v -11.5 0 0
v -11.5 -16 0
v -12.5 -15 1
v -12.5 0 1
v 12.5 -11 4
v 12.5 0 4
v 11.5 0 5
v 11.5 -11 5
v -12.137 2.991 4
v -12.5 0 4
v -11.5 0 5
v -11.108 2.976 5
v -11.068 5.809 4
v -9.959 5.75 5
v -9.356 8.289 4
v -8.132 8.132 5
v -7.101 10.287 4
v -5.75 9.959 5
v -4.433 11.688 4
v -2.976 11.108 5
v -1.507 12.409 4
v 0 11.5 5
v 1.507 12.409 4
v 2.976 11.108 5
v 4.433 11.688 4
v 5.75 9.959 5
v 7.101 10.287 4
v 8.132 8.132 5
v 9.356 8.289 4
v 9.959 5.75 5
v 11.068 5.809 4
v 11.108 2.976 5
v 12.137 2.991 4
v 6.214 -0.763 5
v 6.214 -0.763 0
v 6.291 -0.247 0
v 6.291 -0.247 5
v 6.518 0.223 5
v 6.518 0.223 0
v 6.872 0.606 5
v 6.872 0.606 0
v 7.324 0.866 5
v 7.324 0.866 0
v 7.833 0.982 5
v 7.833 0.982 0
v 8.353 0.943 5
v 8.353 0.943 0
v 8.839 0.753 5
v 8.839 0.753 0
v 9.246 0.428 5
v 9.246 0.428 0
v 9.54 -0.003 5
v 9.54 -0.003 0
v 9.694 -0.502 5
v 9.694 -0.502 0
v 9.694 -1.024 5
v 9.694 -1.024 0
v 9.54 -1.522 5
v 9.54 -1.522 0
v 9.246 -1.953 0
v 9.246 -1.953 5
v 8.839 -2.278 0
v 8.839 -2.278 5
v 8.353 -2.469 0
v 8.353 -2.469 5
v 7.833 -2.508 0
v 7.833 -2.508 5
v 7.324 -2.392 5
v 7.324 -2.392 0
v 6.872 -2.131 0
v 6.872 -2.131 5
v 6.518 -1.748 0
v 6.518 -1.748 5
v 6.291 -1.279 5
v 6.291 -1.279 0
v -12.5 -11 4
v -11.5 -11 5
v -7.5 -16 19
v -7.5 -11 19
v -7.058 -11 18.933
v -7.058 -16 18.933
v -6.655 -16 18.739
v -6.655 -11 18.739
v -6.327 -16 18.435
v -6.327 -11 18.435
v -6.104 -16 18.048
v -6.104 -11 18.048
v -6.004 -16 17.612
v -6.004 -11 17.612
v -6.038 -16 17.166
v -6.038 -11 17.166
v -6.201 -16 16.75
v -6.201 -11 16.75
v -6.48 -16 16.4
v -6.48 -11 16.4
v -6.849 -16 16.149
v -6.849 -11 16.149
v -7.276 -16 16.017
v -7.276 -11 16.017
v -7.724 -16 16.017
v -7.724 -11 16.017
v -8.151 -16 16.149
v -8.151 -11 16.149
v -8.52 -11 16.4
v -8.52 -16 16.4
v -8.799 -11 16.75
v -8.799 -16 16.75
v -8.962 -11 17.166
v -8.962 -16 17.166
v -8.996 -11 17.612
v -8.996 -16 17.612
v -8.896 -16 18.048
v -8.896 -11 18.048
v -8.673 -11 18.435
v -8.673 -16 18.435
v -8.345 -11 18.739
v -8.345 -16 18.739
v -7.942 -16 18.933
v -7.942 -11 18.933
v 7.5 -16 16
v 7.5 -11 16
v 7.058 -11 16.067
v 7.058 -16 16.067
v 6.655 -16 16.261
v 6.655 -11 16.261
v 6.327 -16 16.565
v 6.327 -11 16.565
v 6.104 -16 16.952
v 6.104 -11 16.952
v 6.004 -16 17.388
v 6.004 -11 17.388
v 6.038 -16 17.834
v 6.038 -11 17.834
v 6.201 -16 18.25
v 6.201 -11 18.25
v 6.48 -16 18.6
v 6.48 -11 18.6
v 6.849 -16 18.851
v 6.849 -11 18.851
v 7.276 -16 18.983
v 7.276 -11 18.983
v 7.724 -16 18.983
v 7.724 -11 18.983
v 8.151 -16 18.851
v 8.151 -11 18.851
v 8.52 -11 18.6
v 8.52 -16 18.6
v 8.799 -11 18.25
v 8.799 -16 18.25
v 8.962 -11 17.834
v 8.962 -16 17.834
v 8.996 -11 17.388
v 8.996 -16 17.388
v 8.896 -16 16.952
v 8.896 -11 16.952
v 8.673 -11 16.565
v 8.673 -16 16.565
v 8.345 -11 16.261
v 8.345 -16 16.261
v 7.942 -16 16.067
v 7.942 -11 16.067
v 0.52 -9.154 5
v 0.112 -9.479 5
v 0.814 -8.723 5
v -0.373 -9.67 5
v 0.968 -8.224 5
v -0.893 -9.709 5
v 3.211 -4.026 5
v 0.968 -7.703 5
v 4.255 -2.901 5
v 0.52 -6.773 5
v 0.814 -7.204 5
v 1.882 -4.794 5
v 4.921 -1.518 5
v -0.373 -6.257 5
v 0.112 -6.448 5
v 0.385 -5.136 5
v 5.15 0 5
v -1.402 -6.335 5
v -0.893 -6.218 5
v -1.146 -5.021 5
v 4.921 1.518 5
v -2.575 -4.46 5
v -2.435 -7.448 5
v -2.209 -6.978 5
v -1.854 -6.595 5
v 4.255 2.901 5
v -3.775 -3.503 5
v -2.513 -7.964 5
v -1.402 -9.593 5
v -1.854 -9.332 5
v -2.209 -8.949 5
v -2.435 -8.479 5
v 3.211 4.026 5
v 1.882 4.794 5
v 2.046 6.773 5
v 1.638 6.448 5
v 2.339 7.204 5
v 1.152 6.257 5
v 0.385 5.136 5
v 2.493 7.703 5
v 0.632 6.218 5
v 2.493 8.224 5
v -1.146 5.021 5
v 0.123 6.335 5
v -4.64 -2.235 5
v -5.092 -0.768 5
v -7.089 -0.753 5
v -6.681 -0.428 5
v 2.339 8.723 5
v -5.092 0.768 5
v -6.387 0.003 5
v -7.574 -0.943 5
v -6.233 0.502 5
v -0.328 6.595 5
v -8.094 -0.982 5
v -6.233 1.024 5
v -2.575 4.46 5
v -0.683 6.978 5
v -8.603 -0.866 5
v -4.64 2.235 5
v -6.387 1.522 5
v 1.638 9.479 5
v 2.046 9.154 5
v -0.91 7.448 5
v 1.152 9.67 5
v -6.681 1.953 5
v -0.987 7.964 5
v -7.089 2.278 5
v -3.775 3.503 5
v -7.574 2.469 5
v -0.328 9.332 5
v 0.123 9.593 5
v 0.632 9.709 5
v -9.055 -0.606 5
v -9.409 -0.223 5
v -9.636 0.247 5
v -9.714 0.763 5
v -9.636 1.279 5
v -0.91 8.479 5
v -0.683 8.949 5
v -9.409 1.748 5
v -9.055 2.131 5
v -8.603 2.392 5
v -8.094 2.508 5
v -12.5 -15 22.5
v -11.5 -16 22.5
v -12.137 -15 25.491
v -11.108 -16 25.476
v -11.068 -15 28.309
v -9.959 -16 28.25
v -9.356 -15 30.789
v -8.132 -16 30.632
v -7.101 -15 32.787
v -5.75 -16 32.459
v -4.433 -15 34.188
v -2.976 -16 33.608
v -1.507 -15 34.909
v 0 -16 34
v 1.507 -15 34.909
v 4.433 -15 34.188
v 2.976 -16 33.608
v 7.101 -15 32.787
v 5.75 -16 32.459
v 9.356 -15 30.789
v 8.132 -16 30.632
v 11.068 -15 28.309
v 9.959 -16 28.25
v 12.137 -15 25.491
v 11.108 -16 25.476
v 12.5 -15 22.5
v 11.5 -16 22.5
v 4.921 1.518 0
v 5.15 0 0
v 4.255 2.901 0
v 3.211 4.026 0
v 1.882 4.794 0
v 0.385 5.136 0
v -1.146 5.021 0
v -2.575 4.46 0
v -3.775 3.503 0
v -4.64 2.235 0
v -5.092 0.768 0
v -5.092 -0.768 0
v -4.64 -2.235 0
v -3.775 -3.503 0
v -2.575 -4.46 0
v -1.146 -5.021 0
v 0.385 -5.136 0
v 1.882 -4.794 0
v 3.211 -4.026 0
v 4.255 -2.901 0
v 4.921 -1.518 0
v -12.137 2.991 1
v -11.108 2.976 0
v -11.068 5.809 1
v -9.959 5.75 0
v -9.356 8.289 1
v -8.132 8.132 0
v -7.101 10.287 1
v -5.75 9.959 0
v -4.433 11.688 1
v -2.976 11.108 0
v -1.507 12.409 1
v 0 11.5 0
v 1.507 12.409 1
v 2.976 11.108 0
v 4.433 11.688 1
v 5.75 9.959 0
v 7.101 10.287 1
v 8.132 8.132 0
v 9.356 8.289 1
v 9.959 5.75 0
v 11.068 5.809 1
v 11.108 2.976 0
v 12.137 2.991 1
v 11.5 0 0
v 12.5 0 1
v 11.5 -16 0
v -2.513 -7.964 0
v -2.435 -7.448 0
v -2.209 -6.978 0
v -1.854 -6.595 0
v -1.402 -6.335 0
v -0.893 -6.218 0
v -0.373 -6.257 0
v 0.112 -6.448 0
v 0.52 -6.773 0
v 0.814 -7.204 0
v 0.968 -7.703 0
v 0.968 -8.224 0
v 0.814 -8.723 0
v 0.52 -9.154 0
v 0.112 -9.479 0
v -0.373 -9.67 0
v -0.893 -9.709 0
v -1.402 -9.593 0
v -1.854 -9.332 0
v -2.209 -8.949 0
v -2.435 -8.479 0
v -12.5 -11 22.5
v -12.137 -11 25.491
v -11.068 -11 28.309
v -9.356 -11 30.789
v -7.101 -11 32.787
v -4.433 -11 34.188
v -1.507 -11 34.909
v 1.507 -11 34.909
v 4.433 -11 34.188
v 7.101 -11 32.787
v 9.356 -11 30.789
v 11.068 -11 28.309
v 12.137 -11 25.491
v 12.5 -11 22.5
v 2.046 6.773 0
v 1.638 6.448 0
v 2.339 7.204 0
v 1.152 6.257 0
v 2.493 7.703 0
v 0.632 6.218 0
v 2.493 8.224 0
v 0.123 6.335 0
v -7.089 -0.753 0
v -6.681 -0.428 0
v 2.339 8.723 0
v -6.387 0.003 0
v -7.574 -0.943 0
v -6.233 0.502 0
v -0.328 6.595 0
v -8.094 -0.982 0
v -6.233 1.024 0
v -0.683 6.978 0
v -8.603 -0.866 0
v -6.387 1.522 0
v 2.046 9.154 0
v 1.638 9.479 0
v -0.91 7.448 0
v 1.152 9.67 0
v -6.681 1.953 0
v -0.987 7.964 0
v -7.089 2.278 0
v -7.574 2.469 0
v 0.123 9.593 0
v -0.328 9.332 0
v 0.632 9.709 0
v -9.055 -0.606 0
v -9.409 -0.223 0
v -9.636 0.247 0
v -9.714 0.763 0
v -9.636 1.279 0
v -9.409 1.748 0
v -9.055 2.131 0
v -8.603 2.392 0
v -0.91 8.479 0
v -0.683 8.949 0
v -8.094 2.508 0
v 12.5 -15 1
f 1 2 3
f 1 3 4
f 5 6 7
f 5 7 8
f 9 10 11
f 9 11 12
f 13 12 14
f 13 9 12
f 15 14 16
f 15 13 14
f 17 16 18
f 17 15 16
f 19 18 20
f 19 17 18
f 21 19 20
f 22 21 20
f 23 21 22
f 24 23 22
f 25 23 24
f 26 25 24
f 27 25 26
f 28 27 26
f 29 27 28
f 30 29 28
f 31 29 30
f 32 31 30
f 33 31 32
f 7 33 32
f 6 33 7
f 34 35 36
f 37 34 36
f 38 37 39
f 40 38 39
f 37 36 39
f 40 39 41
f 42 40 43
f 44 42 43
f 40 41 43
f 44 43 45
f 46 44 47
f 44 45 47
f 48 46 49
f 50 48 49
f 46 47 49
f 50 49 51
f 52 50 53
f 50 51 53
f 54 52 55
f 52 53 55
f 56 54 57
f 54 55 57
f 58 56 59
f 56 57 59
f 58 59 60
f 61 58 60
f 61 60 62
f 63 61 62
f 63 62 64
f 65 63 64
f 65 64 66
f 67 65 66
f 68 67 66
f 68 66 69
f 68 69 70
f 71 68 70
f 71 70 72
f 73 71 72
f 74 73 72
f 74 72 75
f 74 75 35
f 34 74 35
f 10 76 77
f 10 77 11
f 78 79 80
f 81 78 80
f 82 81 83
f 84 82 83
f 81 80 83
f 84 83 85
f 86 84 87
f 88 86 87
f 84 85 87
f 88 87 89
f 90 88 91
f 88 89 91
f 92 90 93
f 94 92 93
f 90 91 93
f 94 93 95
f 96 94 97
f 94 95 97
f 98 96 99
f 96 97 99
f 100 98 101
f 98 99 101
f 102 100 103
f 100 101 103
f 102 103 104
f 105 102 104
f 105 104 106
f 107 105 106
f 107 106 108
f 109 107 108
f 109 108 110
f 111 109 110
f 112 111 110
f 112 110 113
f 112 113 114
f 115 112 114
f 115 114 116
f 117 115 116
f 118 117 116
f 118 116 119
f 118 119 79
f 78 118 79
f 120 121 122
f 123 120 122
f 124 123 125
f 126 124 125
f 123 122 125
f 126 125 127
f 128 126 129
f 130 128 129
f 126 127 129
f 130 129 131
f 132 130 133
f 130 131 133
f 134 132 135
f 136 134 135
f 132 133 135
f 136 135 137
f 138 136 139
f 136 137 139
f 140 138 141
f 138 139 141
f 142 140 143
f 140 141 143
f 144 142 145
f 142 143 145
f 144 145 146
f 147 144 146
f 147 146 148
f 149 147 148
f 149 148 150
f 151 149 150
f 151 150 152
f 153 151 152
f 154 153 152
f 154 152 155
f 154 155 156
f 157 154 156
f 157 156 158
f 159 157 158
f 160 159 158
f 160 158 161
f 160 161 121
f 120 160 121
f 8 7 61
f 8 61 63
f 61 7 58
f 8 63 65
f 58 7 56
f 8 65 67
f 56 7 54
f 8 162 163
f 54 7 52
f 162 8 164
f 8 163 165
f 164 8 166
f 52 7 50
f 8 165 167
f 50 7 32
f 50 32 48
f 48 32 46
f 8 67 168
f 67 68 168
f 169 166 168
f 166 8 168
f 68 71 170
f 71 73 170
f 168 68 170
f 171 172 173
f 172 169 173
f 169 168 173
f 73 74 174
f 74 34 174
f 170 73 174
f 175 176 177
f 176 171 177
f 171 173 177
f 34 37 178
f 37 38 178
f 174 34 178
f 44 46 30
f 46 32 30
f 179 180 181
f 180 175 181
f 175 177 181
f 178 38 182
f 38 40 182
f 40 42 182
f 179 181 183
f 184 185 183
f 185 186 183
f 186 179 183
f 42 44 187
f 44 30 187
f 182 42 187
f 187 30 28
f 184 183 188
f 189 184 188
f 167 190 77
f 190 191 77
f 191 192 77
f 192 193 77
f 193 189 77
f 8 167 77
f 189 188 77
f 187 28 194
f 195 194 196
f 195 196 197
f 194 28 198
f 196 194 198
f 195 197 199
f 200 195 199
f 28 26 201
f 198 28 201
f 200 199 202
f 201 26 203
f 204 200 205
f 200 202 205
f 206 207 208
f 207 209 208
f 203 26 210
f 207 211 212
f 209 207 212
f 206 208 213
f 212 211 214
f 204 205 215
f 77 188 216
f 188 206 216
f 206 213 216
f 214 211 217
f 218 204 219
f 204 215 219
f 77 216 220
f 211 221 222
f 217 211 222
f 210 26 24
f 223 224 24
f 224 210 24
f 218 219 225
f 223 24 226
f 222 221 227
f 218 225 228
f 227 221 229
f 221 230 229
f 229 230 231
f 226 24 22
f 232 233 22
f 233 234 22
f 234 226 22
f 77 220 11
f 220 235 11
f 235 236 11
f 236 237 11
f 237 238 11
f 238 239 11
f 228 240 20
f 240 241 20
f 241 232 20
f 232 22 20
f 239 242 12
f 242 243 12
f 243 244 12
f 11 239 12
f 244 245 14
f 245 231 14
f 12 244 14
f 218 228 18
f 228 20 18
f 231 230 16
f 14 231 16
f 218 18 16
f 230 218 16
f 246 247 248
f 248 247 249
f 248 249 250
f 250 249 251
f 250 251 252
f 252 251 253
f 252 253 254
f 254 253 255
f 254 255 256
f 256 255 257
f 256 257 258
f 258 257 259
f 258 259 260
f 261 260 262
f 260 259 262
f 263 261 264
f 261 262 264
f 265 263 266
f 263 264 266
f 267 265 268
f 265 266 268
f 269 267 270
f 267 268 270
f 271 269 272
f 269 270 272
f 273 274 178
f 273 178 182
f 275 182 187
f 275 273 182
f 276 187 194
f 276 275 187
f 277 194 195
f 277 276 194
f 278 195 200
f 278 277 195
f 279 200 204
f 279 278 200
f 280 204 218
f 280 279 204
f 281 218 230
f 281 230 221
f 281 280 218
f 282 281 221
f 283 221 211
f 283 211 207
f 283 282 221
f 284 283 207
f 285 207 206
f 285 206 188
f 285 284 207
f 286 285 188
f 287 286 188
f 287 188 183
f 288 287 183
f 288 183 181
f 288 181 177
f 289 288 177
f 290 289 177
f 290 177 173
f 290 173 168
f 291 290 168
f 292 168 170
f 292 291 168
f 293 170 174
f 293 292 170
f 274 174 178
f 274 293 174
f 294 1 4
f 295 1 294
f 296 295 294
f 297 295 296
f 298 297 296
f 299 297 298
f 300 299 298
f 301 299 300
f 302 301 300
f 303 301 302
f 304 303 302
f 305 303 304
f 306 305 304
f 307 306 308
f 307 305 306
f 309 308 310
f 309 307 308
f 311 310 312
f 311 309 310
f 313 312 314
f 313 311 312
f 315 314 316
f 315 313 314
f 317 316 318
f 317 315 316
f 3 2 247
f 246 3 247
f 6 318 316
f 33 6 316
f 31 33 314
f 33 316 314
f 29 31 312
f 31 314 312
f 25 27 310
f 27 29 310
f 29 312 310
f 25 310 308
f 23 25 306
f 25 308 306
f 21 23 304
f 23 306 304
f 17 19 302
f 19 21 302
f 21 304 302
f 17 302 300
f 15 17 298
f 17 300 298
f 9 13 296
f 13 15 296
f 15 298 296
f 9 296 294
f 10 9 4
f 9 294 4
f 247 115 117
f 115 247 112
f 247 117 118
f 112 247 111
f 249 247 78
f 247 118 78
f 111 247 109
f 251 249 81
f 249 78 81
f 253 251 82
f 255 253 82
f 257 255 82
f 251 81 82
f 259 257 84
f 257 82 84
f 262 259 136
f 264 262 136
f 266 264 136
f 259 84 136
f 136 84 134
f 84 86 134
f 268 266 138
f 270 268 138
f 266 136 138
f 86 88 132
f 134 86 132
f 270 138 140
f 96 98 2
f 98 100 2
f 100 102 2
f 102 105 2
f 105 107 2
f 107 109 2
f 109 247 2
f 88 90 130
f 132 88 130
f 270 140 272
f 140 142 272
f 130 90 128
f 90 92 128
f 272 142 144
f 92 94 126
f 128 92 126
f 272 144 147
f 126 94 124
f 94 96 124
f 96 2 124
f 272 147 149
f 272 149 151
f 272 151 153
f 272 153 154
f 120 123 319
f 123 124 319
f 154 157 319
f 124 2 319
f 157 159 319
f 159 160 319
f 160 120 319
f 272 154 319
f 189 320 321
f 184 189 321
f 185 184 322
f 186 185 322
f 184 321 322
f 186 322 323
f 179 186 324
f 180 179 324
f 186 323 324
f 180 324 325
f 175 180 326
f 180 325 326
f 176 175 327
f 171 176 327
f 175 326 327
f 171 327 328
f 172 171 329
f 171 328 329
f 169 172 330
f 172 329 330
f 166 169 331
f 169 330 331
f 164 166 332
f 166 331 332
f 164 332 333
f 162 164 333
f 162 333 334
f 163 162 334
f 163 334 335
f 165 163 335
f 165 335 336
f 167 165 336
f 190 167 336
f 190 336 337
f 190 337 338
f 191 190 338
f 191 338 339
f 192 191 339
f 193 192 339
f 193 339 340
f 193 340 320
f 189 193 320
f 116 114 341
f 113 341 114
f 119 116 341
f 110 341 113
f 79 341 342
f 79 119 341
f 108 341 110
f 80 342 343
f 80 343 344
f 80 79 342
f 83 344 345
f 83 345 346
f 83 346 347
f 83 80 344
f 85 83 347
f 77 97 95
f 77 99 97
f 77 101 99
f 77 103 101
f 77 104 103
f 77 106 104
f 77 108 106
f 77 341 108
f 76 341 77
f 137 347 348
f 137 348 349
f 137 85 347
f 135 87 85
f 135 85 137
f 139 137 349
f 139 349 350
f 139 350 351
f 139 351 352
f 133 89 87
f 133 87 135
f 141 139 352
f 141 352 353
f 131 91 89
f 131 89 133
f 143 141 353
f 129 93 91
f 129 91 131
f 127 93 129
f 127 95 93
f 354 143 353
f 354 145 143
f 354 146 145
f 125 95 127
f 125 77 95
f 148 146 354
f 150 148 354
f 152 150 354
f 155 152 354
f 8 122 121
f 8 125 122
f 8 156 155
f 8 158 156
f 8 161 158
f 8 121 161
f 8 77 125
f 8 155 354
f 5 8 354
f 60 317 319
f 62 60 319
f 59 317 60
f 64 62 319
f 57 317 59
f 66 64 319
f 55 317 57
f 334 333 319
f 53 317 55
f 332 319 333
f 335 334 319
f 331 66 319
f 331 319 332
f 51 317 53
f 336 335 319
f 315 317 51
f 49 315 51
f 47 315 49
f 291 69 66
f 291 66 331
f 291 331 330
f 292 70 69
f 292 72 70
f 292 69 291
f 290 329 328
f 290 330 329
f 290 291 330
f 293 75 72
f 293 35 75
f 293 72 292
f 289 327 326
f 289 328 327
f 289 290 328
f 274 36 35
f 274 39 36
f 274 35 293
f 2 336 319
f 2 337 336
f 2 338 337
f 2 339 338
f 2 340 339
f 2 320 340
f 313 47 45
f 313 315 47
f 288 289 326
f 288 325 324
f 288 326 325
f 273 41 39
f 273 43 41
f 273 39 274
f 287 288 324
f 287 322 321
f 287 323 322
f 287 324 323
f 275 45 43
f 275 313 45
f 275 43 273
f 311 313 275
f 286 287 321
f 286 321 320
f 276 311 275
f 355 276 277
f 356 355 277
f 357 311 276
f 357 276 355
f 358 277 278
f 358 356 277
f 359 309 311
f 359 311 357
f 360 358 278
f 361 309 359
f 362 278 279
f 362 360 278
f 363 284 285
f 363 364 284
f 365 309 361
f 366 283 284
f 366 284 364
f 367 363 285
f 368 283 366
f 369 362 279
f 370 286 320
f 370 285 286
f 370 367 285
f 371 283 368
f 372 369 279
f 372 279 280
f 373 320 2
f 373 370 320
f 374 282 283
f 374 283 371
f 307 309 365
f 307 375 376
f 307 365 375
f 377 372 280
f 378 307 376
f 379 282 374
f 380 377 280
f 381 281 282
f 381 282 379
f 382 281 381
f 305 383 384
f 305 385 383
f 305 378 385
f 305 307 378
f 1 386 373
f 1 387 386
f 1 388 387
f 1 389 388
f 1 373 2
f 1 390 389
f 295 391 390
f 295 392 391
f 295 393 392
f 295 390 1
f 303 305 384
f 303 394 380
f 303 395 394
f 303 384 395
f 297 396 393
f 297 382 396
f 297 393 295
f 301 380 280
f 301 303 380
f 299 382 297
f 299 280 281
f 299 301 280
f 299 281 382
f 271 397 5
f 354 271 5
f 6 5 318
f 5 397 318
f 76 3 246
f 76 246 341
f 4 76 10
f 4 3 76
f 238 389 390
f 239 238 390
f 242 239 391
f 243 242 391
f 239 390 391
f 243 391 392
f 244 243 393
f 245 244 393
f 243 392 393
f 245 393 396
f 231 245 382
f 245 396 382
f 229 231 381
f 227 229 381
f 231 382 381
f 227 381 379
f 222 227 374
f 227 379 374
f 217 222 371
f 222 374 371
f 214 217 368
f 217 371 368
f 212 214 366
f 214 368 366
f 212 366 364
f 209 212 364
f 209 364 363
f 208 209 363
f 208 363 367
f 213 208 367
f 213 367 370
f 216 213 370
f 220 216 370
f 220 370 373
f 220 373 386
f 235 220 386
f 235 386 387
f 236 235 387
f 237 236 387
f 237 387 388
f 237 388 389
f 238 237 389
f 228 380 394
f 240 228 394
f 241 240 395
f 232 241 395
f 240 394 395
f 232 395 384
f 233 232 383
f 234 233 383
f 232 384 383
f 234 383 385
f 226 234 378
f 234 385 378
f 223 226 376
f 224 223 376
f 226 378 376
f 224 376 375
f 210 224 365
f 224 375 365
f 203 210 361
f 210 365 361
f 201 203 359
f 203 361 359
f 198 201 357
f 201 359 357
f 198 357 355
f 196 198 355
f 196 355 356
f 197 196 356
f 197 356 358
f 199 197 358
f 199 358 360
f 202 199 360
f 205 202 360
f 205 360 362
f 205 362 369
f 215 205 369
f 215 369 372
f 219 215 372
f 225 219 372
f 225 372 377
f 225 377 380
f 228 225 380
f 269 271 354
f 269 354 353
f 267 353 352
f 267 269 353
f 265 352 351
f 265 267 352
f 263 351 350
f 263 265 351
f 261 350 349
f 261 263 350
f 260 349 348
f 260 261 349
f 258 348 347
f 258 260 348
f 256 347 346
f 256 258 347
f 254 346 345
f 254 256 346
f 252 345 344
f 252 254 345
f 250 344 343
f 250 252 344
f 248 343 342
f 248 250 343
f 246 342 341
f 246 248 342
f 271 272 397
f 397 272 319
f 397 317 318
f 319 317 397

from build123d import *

# Parameters (mm, degrees)
ESQUISSE1_R             = 12.5
ESQUISSE1_R_2           = 5.15
BOSS_EXTRU_1_DEPTH      = 5
BOSS_EXTRU_2_DEPTH      = 5
ESQUISSE3_W             = 25
ESQUISSE3_H             = 5
BOSS_EXTRU_3_DEPTH      = 30
ESQUISSE5_R             = 1.75
ENL_V_MAT_EXTRU_1_DEPTH = 41.462946012
CONG_1_RADIUS           = 12.5
CONG_1_LENGTH           = 5
ESQUISSE6_R             = 1.5
ENL_V_MAT_EXTRU_2_DEPTH = 44.971581732
CHANFREIN1_SIZE         = 1
CHANFREIN2_SIZE         = 1


with BuildPart() as part:
    # Esquisse1 → Boss.-Extru.1 (new body)
    with BuildSketch(Plane.XY):
        Circle(ESQUISSE1_R)
        Circle(ESQUISSE1_R_2, mode=Mode.SUBTRACT)
    extrude(amount=BOSS_EXTRU_1_DEPTH)

    # Esquisse2 → Boss.-Extru.2 (add)
    with BuildSketch(Plane(origin=(0, 0, 0), x_dir=(-1, 0, 0), z_dir=(0, 0, -1))):
        with BuildLine():
            Line((-12.5, 0), (-12.5, -16))
            Line((-12.5, -16), (12.5, -16))
            Line((12.5, -16), (12.5, 0))
            ThreePointArc((12.5, 0), (0, -12.5), (-12.5, 0))
        make_face()
    extrude(amount=-BOSS_EXTRU_2_DEPTH)

    # Esquisse3 → Boss.-Extru.3 (add)
    with BuildSketch(Plane.XY.offset(5)):
        with Locations((0, -13.5)):
            Rectangle(ESQUISSE3_W, ESQUISSE3_H)
    extrude(amount=BOSS_EXTRU_3_DEPTH)

    # Esquisse5 → Enlèv. mat.-Extru.1 (cut, through all)
    with BuildSketch(Plane(origin=(0, 0, 0), x_dir=(-1, 0, 0), z_dir=(0, 0, -1))):
        with Locations((-0.762684291, 7.963561557)):
            Circle(ESQUISSE5_R)
        with Locations((-7.963561557, -0.762684291)):
            Circle(ESQUISSE5_R)
        with Locations((7.963561557, 0.762684291)):
            Circle(ESQUISSE5_R)
        with Locations((0.762684291, -7.963561557)):
            Circle(ESQUISSE5_R)
    extrude(amount=-ENL_V_MAT_EXTRU_1_DEPTH, mode=Mode.SUBTRACT)

    # Congé1: full round fillet: the end face becomes a half cylinder, R = half its width
    cong_1_face = Plane((0, -13.5, 35), x_dir=(0, -1, 0), z_dir=(0, 0, 1))  # on the end face: x along it, z out of the body
    cong_1_slab = cong_1_face.offset(-CONG_1_RADIUS / 2) * Box(CONG_1_LENGTH, 2 * CONG_1_RADIUS, CONG_1_RADIUS, mode=Mode.PRIVATE)  # the body's end, R deep
    cong_1_round = Plane((0, -13.5, 22.5), x_dir=(0, 0, 1), z_dir=(0, -1, 0)) * Cylinder(CONG_1_RADIUS, CONG_1_LENGTH, mode=Mode.PRIVATE)  # its axis R under the face
    add(cong_1_slab - cong_1_round, mode=Mode.SUBTRACT)

    # Esquisse6 → Enlèv. mat.-Extru.2 (cut, through all)
    with BuildSketch(Plane(origin=(0, -11, 0), x_dir=(1, 0, 0), z_dir=(0, 1, 0))):
        with Locations(Location((-7.5, -17.5, 0), (0, 0, 270))):
            Circle(ESQUISSE6_R)
        with Locations(Location((7.5, -17.5, 0), (0, 0, 90))):
            Circle(ESQUISSE6_R)
    extrude(amount=-ENL_V_MAT_EXTRU_2_DEPTH, mode=Mode.SUBTRACT)

    # Chanfrein1
    chanfrein1_edges = [part.edges().sort_by_distance(p)[0] for p in [
        (12.5, -5.5, 5),
        (-12.5, -5.5, 5),
        (0, 12.5, 5),
    ]]
    chamfer(chanfrein1_edges, length=CHANFREIN1_SIZE)

    # Chanfrein2
    chanfrein2_edges = [part.edges().sort_by_distance(p)[0] for p in [
        (12.5, -8, 0),
        (-12.5, -8, 0),
        (0, 12.5, 0),
        (-12.5, -16, 11.25),
        (12.5, -16, 11.25),
        (0, -16, 35),
    ]]
    chamfer(chanfrein2_edges, length=CHANFREIN2_SIZE)


solid = part.part
